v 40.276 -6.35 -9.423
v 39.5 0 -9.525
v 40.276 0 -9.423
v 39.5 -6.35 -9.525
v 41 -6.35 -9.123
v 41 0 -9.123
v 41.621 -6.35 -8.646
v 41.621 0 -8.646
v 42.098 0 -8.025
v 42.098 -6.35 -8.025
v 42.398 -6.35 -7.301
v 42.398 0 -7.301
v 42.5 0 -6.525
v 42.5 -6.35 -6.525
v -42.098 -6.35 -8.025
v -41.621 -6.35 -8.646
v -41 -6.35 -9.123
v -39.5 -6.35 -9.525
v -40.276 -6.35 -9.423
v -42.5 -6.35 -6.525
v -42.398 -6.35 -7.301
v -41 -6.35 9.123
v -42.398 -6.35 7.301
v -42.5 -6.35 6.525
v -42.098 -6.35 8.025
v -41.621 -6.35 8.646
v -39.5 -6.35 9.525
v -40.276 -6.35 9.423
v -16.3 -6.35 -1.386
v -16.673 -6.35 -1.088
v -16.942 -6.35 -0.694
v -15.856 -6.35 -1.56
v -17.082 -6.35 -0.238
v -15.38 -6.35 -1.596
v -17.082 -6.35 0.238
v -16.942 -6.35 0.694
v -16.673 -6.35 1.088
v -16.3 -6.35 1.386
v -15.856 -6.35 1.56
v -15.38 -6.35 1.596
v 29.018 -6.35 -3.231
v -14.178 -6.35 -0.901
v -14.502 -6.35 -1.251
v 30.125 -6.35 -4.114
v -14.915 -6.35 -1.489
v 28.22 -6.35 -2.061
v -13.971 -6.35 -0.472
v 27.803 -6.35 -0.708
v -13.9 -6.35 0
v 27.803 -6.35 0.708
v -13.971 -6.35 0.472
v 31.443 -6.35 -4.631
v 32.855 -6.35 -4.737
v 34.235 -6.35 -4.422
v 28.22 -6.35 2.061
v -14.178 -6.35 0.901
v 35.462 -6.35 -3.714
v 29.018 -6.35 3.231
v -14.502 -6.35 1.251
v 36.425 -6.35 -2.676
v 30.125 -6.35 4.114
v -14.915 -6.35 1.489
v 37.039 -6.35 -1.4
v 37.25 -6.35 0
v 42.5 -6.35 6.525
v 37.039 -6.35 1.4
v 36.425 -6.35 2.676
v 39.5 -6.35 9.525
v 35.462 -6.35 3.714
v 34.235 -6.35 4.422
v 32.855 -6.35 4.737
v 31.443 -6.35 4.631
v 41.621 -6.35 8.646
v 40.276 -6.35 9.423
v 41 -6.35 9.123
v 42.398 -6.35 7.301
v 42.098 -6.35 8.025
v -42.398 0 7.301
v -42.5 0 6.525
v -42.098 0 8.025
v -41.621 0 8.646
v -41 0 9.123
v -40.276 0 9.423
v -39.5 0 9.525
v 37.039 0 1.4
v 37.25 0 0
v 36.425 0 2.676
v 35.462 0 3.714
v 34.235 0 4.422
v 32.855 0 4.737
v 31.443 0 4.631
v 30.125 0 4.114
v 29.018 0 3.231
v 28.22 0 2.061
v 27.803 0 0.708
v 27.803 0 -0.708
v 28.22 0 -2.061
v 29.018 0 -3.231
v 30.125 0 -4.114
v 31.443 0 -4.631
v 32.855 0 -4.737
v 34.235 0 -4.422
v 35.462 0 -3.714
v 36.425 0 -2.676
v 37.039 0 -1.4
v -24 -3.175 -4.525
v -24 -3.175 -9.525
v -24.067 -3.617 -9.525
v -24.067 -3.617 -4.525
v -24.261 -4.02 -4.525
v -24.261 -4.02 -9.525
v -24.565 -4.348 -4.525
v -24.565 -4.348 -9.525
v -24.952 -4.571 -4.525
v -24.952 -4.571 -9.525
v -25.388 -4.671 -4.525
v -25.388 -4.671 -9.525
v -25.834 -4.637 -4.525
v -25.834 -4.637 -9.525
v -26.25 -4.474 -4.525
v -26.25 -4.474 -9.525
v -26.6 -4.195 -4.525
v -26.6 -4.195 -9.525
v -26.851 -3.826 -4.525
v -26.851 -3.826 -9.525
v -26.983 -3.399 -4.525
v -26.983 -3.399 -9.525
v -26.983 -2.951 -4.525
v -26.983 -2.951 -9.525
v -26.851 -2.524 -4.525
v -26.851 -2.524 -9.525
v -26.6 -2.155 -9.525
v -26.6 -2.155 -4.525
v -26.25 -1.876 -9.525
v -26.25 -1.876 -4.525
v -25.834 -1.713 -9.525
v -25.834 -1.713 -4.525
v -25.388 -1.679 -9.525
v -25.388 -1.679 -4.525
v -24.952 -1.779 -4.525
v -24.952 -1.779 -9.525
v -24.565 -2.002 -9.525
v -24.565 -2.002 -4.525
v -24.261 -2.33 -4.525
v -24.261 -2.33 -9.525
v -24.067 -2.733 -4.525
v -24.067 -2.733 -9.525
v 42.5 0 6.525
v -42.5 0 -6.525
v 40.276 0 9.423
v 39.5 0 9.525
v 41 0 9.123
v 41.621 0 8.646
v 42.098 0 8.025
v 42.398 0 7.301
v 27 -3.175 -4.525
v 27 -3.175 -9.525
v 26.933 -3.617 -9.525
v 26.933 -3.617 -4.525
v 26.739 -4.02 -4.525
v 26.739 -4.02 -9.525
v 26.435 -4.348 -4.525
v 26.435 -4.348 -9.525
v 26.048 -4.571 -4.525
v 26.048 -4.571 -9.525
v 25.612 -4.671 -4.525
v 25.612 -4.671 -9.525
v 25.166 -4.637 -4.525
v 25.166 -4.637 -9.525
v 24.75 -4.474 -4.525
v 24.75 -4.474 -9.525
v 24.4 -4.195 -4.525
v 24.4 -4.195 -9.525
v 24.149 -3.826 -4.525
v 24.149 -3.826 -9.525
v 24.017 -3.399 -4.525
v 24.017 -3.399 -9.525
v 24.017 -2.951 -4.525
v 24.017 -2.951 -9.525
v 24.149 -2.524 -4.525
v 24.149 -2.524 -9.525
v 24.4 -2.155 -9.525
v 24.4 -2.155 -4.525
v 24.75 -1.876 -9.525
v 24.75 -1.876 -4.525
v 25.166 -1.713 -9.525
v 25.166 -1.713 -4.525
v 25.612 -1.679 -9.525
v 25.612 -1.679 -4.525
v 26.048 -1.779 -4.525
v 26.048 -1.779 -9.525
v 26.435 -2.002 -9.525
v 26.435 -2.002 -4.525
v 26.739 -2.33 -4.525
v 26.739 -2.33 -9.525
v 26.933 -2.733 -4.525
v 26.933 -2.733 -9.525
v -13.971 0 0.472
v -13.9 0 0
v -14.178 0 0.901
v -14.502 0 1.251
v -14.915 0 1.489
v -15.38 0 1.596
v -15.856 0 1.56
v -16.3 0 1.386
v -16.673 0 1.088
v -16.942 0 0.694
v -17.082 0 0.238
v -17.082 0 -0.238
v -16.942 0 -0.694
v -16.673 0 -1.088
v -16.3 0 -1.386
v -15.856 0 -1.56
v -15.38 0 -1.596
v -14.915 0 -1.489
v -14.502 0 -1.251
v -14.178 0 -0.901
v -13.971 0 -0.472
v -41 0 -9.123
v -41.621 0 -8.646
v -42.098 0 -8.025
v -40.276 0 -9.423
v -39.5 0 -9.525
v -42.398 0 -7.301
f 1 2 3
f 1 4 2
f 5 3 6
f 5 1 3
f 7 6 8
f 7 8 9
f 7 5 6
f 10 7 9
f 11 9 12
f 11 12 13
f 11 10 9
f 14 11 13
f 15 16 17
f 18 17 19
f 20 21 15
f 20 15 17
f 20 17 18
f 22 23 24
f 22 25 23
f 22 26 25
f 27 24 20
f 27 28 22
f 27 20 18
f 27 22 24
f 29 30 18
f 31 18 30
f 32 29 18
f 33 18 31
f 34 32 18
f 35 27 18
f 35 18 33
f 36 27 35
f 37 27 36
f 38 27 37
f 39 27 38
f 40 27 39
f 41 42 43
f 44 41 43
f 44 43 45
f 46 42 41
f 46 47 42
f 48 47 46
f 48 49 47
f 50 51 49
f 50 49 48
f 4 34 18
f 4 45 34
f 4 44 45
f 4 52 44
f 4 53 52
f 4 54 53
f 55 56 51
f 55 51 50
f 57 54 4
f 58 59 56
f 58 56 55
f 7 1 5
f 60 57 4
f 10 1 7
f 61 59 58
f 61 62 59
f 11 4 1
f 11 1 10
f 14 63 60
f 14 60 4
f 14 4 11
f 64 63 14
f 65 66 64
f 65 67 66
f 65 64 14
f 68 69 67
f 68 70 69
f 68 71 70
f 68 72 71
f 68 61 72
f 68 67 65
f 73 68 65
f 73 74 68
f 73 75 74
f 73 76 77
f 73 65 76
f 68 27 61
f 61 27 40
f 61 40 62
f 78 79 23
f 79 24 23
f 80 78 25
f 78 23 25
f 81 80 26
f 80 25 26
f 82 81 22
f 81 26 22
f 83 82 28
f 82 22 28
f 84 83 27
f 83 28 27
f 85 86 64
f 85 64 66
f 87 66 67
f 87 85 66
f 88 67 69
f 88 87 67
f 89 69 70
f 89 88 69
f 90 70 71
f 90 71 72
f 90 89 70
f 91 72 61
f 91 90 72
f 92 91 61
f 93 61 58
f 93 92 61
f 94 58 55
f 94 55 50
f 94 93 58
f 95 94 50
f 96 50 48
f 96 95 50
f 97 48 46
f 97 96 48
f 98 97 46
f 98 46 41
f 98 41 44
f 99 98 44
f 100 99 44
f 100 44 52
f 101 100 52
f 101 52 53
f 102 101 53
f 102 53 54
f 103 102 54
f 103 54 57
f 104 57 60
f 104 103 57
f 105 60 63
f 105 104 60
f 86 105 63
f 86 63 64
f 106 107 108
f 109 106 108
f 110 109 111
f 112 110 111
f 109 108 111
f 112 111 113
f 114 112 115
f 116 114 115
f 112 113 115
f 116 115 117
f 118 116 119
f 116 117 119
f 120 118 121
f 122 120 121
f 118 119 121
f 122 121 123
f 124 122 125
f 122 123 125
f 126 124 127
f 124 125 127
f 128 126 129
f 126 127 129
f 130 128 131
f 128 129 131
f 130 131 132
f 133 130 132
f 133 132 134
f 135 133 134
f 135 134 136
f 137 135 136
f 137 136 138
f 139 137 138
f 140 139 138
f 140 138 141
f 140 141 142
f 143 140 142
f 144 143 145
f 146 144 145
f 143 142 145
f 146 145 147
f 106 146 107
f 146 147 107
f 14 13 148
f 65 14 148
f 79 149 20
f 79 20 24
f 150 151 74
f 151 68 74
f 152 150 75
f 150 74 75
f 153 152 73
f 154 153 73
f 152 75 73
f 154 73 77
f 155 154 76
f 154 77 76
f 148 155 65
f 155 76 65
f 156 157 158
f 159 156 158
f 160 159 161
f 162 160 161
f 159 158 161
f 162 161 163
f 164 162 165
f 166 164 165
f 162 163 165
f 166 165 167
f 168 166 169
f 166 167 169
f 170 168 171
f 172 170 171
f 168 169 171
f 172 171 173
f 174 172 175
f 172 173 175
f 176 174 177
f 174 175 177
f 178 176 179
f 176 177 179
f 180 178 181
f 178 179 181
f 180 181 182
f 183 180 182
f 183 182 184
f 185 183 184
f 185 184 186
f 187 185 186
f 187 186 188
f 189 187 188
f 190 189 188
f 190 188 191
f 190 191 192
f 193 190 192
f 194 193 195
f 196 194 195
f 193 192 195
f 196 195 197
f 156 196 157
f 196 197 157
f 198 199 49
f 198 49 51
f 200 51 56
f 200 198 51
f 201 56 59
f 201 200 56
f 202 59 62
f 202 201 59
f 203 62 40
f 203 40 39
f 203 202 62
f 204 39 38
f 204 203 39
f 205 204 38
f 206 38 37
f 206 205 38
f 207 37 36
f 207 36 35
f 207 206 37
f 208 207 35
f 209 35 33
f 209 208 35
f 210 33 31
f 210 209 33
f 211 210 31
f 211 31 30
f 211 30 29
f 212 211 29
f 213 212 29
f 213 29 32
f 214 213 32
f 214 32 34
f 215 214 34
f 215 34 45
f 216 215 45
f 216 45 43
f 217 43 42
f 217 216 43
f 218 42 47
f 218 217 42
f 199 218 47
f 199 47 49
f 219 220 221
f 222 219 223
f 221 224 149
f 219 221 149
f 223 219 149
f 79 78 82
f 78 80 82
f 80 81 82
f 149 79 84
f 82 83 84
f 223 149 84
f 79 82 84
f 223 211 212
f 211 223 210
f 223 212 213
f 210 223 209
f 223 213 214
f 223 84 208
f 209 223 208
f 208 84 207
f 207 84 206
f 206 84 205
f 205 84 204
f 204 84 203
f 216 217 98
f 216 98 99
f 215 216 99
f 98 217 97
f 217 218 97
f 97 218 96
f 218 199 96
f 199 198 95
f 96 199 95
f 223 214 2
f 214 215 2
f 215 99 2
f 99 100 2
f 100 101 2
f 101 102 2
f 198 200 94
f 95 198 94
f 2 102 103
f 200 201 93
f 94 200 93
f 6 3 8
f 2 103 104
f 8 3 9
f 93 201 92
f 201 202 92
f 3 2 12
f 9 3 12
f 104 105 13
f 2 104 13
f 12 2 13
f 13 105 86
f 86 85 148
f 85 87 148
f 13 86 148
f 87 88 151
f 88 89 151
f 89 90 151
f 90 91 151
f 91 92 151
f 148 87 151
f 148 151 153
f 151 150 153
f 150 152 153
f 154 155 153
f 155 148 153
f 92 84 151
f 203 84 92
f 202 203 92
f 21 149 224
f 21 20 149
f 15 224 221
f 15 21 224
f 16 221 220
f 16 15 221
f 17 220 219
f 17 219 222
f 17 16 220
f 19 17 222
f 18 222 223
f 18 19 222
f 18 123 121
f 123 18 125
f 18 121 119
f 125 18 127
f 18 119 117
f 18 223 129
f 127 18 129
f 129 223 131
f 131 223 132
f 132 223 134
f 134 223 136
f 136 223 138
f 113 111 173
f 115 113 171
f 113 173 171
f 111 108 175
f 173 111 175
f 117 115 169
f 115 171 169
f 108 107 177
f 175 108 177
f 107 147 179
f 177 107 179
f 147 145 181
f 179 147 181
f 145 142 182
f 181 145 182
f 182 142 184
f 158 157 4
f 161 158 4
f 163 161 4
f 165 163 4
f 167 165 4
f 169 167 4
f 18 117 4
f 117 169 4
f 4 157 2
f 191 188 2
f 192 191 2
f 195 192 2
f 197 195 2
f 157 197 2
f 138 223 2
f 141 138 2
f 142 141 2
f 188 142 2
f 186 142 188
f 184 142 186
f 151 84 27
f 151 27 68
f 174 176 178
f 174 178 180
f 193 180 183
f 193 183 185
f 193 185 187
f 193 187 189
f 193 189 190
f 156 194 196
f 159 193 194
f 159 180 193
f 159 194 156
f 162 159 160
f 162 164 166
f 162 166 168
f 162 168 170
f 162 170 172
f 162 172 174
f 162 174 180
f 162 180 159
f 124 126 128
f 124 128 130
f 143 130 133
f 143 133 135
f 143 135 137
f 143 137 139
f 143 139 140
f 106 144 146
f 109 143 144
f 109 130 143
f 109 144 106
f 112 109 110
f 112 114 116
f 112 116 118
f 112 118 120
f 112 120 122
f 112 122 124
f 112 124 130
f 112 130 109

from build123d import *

# Parameters (mm, degrees)
F0_W     = 85
F0_H     = 19.05
F0_R     = 1.6
F0_R_2   = 4.75
F1_DEPTH = 6.35
F2_R     = 1.5
F3_DEPTH = 5
F4_R     = 3


with BuildPart() as f1:
    # F0 (on Front) → F1 (new body)
    with BuildSketch(Plane.XZ):
        Rectangle(F0_W, F0_H)
        with Locations((-15.5, 0)):
            Circle(F0_R, mode=Mode.SUBTRACT)
        with Locations((32.5, 0)):
            Circle(F0_R_2, mode=Mode.SUBTRACT)
    extrude(amount=F1_DEPTH)

    # F2 (on face) → F3 (cut)
    with BuildSketch(Plane(origin=(0, 0, -9.525), x_dir=(1, 0, 0), z_dir=(0, 0, -1))):
        with Locations((-25.5, 3.175)):
            Circle(F2_R)
        with Locations((25.5, 3.175)):
            Circle(F2_R)
    extrude(amount=-F3_DEPTH, mode=Mode.SUBTRACT)

    # F4
    f4_edges = [f1.edges().sort_by_distance(p)[0] for p in [
        (-42.5, -3.175, -9.525),
        (42.5, -3.175, -9.525),
        (42.5, -3.175, 9.525),
        (-42.5, -3.175, 9.525),
    ]]
    fillet(f4_edges, radius=F4_R)


solid = f1.part
